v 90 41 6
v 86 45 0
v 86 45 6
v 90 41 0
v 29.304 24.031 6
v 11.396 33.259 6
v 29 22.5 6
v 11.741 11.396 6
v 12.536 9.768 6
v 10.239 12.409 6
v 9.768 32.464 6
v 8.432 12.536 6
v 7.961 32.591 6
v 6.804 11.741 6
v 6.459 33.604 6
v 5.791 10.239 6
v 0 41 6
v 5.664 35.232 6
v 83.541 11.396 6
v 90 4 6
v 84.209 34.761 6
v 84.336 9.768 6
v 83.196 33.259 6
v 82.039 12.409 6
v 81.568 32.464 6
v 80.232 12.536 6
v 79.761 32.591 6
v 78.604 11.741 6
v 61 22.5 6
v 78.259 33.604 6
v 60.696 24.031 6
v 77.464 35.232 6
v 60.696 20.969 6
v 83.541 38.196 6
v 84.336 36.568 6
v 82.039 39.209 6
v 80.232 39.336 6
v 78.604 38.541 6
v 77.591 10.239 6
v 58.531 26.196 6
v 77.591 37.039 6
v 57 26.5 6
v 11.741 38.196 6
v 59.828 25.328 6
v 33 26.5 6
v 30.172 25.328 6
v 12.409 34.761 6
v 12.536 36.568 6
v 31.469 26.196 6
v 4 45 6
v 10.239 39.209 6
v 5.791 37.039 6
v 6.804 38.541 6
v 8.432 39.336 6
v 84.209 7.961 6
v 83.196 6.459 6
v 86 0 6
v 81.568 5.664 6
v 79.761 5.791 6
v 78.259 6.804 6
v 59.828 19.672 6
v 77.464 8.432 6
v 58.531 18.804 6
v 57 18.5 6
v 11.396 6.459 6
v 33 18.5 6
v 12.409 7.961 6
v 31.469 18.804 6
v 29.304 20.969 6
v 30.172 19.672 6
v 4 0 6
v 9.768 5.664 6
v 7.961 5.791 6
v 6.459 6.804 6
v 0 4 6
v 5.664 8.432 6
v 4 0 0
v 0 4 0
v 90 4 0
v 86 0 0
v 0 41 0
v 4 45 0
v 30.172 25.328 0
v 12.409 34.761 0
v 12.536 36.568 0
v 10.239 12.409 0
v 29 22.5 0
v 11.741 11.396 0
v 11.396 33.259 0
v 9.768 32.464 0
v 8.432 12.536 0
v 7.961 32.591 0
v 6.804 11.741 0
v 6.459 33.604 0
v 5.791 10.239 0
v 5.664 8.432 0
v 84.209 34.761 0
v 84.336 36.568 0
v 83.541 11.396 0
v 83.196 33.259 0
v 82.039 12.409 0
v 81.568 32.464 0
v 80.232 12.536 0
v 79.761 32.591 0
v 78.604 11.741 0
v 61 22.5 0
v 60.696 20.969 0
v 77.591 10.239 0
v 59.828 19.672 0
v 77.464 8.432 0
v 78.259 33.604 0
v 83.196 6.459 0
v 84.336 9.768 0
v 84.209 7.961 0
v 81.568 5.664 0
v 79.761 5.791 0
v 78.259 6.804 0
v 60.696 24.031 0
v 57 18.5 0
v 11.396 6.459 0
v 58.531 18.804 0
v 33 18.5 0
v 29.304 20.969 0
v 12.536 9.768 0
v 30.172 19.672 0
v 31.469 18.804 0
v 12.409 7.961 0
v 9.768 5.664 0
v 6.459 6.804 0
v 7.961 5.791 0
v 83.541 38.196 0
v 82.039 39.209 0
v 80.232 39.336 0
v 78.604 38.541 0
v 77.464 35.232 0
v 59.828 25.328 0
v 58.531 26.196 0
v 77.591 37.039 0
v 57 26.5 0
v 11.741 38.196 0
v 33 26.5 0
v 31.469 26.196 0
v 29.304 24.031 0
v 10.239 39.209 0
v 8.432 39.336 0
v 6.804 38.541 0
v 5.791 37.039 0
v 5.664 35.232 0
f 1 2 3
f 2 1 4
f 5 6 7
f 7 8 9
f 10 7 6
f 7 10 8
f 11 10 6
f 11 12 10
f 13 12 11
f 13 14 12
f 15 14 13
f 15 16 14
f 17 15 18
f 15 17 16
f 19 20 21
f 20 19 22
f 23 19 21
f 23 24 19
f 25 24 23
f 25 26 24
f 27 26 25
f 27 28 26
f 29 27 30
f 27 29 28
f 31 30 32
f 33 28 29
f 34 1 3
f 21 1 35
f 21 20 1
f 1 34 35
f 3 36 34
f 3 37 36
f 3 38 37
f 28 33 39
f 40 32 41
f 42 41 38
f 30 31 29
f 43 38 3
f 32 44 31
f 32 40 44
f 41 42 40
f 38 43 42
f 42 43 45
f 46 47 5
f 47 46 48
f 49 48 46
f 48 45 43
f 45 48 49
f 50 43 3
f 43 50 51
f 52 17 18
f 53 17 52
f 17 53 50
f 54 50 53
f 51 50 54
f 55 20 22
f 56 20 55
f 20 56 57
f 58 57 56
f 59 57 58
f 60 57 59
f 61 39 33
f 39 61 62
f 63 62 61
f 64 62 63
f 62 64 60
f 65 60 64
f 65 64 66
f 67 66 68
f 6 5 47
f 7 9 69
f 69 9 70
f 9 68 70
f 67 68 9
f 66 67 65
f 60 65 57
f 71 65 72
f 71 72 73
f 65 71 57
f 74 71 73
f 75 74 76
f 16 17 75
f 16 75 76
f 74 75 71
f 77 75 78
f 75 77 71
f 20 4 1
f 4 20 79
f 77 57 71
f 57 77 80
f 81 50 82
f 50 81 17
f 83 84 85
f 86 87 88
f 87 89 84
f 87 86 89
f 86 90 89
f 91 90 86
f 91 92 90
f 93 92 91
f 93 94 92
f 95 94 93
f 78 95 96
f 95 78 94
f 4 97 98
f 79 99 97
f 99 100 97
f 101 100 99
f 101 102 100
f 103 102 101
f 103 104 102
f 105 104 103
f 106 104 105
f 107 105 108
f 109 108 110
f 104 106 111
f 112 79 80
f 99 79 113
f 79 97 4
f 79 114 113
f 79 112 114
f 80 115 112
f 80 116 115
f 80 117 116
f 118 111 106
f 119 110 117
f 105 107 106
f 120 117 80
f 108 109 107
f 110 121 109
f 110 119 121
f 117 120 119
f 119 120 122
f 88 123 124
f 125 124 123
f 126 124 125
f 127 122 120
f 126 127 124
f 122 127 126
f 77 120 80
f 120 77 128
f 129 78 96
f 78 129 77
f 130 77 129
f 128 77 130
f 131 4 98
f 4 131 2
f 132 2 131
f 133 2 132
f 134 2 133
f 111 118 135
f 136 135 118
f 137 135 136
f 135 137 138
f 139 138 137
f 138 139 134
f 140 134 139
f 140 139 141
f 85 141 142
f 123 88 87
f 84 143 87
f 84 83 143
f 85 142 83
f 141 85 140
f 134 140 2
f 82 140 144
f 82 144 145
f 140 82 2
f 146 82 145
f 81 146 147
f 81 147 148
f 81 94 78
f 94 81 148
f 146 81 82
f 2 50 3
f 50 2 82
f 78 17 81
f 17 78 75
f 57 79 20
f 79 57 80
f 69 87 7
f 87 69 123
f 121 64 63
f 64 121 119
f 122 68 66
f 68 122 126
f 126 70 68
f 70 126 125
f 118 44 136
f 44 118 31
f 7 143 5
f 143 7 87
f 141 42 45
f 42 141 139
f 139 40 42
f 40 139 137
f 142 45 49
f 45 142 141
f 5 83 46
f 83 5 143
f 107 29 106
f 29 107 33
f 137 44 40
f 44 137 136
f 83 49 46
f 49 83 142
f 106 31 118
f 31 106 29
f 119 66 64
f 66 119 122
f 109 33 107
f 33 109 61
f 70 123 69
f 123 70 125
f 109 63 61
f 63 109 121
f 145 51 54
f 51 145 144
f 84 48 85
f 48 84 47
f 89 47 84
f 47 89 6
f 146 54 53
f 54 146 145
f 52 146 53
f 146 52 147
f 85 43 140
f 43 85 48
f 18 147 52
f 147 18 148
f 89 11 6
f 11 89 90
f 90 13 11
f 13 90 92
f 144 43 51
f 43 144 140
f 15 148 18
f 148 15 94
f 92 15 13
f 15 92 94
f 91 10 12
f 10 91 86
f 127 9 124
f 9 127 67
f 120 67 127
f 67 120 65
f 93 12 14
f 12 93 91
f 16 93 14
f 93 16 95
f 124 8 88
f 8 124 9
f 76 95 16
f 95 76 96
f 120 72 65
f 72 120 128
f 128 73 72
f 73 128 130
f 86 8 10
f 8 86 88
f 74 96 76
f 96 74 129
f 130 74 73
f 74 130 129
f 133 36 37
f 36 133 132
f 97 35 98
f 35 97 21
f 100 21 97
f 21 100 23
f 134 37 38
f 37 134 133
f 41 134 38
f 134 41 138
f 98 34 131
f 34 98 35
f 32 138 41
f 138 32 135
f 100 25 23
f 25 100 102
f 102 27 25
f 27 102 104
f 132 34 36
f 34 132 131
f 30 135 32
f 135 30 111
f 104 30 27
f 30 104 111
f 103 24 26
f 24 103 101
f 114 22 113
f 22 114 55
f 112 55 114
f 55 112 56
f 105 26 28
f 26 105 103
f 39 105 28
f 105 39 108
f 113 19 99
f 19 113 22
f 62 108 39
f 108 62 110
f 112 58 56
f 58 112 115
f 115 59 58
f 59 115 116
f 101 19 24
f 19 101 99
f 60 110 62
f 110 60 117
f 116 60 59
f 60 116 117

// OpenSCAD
$fn = 32;

// ----------------------------------------------------------------------
// Bracket plate: slot plate 90 x 45
// ----------------------------------------------------------------------

// --- parameters (mm) ---
hole_r = 3.5;             // bolt hole radius
plate_t = 6;              // plate thickness, Z (extrusion height)
plate_l = 90;             // plate length
plate_w = 45;             // plate width
slot_l = 24;              // slot straight length
slot_r = 4;               // slot end radius

slot_len = slot_l + 2 * slot_r;
slot_w = 2 * slot_r;
hole_d2 = 2 * hole_r;

profile = [[4, 0], [86, 0], [90, 4], [90, 41], [86, 45], [4, 45], [0, 41], [0, 4]];  // primary outline, 8 points, counter clockwise
void_1 = [[57, 18.5], [58.531, 18.804], [59.828, 19.672], [60.696, 20.969], [61, 22.5], [60.696, 24.031], [59.828, 25.328], [58.531, 26.196], [57, 26.5], [33, 26.5], [31.469, 26.196], [30.172, 25.328], [29.304, 24.031], [29, 22.5], [29.304, 20.969], [30.172, 19.672], [31.469, 18.804], [33, 18.5]];  // grip slot, 18 points
void_2 = [[12.536, 36.568], [11.741, 38.196], [10.239, 39.209], [8.432, 39.336], [6.804, 38.541], [5.791, 37.039], [5.664, 35.232], [6.459, 33.604], [7.961, 32.591], [9.768, 32.464], [11.396, 33.259], [12.409, 34.761]];  // corner hole, 12 points
void_3 = [[12.536, 9.768], [11.741, 11.396], [10.239, 12.409], [8.432, 12.536], [6.804, 11.741], [5.791, 10.239], [5.664, 8.432], [6.459, 6.804], [7.961, 5.791], [9.768, 5.664], [11.396, 6.459], [12.409, 7.961]];  // corner hole, 12 points
void_4 = [[84.336, 36.568], [83.541, 38.196], [82.039, 39.209], [80.232, 39.336], [78.604, 38.541], [77.591, 37.039], [77.464, 35.232], [78.259, 33.604], [79.761, 32.591], [81.568, 32.464], [83.196, 33.259], [84.209, 34.761]];  // corner hole, 12 points
void_5 = [[84.336, 9.768], [83.541, 11.396], [82.039, 12.409], [80.232, 12.536], [78.604, 11.741], [77.591, 10.239], [77.464, 8.432], [78.259, 6.804], [79.761, 5.791], [81.568, 5.664], [83.196, 6.459], [84.209, 7.961]];  // corner hole, 12 points

// --- the one profile operation ---
difference() {
  linear_extrude(height = plate_t) polygon(points = profile);
  translate([0, 0, -1])
    linear_extrude(height = plate_t + 2) polygon(points = void_1);
  translate([0, 0, -1])
    linear_extrude(height = plate_t + 2) polygon(points = void_2);
  translate([0, 0, -1])
    linear_extrude(height = plate_t + 2) polygon(points = void_3);
  translate([0, 0, -1])
    linear_extrude(height = plate_t + 2) polygon(points = void_4);
  translate([0, 0, -1])
    linear_extrude(height = plate_t + 2) polygon(points = void_5);
}
